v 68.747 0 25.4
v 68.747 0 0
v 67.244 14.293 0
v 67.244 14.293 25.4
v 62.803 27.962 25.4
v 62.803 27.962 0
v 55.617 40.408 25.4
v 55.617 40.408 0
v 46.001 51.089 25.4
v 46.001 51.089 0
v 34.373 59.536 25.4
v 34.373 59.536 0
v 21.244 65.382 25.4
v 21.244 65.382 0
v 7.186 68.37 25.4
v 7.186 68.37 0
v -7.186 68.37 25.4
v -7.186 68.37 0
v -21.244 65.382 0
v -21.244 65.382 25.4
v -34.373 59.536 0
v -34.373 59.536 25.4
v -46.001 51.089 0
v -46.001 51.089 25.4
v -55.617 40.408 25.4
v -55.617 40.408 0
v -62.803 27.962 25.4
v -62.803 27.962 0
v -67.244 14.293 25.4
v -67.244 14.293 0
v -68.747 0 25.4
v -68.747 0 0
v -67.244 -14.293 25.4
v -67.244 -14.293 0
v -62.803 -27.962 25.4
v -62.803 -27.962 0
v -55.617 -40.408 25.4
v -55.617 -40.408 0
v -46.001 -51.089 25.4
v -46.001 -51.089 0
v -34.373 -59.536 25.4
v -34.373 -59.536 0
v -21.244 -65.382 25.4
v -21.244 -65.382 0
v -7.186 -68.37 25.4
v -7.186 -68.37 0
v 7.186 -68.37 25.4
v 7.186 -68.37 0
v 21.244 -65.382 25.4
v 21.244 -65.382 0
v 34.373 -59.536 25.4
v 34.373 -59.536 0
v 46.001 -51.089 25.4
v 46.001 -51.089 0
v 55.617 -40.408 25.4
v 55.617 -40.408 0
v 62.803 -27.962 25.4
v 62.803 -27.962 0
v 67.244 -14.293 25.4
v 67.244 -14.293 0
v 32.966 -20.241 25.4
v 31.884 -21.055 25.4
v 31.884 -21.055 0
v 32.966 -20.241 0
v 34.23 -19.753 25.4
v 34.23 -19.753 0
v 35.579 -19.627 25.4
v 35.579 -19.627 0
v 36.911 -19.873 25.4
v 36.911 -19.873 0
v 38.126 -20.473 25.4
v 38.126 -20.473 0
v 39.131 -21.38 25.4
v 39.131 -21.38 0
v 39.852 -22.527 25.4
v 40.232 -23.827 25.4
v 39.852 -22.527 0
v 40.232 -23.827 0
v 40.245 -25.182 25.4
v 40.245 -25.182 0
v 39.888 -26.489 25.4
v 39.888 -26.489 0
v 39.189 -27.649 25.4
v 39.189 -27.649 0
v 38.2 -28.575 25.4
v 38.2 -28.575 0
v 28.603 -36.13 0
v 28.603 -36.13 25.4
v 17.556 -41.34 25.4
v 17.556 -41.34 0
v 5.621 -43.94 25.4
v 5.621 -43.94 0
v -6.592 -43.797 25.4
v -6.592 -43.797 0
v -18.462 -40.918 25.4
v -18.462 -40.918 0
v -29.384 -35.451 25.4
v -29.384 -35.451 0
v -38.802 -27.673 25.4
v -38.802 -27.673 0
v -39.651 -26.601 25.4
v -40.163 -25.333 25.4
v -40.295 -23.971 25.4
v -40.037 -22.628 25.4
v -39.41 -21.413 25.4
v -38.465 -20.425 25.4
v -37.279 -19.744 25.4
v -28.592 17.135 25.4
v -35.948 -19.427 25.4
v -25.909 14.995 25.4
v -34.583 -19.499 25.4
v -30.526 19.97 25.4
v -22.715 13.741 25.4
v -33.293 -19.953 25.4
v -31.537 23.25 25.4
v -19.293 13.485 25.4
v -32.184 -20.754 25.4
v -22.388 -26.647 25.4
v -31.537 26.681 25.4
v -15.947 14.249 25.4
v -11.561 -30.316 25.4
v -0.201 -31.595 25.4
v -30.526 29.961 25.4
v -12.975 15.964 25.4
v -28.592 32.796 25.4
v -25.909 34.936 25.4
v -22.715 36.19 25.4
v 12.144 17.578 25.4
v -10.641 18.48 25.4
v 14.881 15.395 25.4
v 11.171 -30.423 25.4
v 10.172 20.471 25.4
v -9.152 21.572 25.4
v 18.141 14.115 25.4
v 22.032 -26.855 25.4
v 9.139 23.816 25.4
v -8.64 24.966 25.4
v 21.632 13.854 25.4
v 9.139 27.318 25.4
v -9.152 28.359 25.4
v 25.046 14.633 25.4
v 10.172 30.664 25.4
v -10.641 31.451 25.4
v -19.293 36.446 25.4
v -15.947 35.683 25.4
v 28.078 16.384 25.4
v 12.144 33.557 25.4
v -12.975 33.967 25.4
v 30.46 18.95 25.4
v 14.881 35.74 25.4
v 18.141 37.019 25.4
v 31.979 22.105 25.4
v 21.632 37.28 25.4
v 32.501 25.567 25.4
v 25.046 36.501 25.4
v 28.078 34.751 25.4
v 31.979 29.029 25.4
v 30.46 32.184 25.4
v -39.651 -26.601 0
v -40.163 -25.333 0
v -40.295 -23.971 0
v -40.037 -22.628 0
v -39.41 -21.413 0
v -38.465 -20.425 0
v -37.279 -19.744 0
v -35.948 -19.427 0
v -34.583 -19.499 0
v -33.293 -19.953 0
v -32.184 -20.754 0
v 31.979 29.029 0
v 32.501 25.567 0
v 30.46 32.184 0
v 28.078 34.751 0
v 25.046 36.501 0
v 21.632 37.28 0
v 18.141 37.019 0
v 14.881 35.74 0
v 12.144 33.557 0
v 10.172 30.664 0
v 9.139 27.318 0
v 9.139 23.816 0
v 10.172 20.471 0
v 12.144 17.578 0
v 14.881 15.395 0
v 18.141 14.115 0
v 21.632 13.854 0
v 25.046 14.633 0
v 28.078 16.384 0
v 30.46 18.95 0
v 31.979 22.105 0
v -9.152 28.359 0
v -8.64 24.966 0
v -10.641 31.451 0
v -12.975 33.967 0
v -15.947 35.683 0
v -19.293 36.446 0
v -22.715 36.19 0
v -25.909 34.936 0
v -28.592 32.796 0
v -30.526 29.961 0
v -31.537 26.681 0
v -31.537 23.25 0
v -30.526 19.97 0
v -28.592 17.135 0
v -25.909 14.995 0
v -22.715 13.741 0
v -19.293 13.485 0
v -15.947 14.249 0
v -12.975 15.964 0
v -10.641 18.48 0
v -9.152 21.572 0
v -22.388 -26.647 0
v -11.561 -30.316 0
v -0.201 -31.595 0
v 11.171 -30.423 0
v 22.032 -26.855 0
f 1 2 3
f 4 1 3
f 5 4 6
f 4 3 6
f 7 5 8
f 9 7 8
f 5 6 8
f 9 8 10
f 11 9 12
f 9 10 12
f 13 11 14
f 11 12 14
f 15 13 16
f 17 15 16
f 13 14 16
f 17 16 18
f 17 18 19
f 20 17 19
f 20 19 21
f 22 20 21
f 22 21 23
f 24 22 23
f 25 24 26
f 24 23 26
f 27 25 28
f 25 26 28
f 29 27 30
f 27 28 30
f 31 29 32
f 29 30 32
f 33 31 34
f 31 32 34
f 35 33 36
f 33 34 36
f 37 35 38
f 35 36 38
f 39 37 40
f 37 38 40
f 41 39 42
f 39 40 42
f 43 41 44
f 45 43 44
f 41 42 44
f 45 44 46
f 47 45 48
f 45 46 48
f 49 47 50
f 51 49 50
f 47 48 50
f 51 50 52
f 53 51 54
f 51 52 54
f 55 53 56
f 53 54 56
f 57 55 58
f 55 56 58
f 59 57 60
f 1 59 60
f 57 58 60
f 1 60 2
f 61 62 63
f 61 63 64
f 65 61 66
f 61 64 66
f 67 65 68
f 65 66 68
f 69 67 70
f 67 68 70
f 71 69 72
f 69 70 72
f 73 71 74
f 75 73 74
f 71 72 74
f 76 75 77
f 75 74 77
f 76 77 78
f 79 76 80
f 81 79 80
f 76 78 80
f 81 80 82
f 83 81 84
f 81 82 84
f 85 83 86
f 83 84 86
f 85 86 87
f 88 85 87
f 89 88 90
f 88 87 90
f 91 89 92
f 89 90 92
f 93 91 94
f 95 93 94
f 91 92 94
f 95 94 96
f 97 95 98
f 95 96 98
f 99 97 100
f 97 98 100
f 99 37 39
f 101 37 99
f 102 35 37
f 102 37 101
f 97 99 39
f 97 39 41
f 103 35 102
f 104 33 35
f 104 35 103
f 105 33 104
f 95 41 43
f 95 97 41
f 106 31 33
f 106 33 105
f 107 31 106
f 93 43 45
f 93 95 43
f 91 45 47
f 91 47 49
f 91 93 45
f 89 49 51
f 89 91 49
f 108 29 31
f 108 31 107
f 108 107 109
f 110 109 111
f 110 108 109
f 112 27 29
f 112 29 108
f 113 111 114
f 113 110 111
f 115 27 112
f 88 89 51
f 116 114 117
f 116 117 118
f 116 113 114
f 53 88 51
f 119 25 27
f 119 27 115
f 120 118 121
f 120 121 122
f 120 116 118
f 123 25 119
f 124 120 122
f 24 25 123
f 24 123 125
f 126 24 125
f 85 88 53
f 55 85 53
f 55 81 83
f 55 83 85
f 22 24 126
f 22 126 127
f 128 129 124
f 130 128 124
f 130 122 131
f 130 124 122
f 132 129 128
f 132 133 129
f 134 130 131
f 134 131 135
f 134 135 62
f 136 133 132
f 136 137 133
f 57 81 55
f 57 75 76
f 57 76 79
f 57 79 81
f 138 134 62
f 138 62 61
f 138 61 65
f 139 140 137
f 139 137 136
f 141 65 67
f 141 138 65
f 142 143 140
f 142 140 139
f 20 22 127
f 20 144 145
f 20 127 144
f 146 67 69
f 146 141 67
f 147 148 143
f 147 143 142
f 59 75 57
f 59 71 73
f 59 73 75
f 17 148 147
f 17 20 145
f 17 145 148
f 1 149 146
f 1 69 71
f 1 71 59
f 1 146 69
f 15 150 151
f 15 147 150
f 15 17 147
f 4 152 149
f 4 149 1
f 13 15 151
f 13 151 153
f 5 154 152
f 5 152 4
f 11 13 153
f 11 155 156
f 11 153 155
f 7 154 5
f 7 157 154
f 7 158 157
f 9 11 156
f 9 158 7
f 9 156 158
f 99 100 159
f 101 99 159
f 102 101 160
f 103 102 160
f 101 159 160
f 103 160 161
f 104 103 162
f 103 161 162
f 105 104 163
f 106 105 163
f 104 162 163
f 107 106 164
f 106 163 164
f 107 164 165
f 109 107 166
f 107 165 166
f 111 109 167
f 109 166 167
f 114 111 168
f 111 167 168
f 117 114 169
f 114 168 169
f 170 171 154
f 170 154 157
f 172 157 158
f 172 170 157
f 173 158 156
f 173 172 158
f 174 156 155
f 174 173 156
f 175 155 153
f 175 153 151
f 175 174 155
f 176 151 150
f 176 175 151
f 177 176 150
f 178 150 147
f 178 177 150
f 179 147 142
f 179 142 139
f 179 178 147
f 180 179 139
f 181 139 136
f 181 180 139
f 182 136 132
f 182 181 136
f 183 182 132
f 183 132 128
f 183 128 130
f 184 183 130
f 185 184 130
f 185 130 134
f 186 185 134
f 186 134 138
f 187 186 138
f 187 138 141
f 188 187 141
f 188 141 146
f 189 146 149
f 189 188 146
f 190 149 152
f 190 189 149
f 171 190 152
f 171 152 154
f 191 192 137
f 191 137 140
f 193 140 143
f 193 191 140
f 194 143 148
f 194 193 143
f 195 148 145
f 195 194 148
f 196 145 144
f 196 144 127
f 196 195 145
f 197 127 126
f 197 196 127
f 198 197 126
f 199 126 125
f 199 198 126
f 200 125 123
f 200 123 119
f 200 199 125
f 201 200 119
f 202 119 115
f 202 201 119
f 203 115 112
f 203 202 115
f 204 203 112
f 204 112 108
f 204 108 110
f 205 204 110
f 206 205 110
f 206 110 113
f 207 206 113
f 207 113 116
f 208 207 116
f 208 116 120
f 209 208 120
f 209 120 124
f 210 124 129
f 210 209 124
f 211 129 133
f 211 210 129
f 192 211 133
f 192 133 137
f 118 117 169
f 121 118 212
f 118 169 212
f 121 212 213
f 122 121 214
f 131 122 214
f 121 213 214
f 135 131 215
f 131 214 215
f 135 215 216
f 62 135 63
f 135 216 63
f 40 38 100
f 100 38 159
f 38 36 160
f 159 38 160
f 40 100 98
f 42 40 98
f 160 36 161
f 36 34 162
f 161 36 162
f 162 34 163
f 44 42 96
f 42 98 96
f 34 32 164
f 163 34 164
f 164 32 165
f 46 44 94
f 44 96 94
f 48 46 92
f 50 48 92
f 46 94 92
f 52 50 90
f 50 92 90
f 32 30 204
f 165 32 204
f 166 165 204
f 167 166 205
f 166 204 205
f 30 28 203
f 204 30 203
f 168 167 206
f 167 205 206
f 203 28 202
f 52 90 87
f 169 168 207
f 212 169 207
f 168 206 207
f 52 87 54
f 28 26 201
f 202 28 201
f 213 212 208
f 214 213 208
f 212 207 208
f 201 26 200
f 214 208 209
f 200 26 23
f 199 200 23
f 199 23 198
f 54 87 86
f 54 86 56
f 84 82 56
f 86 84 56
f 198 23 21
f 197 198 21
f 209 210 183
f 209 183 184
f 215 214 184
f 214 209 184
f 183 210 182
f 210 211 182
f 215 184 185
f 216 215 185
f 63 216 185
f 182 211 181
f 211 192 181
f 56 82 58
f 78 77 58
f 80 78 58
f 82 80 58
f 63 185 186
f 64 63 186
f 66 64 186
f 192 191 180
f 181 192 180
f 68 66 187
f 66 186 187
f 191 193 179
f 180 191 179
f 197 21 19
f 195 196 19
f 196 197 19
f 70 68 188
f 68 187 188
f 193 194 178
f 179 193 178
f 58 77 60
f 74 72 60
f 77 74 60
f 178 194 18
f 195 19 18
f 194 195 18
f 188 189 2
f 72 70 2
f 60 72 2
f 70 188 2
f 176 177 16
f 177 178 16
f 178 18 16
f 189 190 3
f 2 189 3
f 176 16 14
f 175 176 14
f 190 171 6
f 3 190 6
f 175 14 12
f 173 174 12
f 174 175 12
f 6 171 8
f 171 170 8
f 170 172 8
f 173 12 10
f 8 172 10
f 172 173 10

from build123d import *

# Parameters (mm, degrees)
F0_R     = 68.746685
F0_R_2   = 11.512812
F0_R_3   = 11.746204
F1_DEPTH = 25.4


with BuildPart() as f1:
    # F0 (on Top) → F1 (new body)
    with BuildSketch(Plane.XY):
        Circle(F0_R)
        with BuildLine():
            ThreePointArc((38.200267, -28.575001), (-0.489346, -44.214171), (-38.801841, -27.672632))
            ThreePointArc((-38.801841, -27.672632), (-38.972847, -20.885155), (-32.184474, -20.754473))
            ThreePointArc((-32.184474, -20.754473), (-0.200583, -31.594777), (31.883683, -21.055264))
            ThreePointArc((31.883683, -21.055264), (39.13117, -21.380206), (38.200267, -28.575001))
        make_face(mode=Mode.SUBTRACT)
        with Locations((-20.152895, 24.965527)):
            Circle(F0_R_2, mode=Mode.SUBTRACT)
        with Locations((20.754473, 25.567105)):
            Circle(F0_R_3, mode=Mode.SUBTRACT)
    extrude(amount=F1_DEPTH)


solid = f1.part
